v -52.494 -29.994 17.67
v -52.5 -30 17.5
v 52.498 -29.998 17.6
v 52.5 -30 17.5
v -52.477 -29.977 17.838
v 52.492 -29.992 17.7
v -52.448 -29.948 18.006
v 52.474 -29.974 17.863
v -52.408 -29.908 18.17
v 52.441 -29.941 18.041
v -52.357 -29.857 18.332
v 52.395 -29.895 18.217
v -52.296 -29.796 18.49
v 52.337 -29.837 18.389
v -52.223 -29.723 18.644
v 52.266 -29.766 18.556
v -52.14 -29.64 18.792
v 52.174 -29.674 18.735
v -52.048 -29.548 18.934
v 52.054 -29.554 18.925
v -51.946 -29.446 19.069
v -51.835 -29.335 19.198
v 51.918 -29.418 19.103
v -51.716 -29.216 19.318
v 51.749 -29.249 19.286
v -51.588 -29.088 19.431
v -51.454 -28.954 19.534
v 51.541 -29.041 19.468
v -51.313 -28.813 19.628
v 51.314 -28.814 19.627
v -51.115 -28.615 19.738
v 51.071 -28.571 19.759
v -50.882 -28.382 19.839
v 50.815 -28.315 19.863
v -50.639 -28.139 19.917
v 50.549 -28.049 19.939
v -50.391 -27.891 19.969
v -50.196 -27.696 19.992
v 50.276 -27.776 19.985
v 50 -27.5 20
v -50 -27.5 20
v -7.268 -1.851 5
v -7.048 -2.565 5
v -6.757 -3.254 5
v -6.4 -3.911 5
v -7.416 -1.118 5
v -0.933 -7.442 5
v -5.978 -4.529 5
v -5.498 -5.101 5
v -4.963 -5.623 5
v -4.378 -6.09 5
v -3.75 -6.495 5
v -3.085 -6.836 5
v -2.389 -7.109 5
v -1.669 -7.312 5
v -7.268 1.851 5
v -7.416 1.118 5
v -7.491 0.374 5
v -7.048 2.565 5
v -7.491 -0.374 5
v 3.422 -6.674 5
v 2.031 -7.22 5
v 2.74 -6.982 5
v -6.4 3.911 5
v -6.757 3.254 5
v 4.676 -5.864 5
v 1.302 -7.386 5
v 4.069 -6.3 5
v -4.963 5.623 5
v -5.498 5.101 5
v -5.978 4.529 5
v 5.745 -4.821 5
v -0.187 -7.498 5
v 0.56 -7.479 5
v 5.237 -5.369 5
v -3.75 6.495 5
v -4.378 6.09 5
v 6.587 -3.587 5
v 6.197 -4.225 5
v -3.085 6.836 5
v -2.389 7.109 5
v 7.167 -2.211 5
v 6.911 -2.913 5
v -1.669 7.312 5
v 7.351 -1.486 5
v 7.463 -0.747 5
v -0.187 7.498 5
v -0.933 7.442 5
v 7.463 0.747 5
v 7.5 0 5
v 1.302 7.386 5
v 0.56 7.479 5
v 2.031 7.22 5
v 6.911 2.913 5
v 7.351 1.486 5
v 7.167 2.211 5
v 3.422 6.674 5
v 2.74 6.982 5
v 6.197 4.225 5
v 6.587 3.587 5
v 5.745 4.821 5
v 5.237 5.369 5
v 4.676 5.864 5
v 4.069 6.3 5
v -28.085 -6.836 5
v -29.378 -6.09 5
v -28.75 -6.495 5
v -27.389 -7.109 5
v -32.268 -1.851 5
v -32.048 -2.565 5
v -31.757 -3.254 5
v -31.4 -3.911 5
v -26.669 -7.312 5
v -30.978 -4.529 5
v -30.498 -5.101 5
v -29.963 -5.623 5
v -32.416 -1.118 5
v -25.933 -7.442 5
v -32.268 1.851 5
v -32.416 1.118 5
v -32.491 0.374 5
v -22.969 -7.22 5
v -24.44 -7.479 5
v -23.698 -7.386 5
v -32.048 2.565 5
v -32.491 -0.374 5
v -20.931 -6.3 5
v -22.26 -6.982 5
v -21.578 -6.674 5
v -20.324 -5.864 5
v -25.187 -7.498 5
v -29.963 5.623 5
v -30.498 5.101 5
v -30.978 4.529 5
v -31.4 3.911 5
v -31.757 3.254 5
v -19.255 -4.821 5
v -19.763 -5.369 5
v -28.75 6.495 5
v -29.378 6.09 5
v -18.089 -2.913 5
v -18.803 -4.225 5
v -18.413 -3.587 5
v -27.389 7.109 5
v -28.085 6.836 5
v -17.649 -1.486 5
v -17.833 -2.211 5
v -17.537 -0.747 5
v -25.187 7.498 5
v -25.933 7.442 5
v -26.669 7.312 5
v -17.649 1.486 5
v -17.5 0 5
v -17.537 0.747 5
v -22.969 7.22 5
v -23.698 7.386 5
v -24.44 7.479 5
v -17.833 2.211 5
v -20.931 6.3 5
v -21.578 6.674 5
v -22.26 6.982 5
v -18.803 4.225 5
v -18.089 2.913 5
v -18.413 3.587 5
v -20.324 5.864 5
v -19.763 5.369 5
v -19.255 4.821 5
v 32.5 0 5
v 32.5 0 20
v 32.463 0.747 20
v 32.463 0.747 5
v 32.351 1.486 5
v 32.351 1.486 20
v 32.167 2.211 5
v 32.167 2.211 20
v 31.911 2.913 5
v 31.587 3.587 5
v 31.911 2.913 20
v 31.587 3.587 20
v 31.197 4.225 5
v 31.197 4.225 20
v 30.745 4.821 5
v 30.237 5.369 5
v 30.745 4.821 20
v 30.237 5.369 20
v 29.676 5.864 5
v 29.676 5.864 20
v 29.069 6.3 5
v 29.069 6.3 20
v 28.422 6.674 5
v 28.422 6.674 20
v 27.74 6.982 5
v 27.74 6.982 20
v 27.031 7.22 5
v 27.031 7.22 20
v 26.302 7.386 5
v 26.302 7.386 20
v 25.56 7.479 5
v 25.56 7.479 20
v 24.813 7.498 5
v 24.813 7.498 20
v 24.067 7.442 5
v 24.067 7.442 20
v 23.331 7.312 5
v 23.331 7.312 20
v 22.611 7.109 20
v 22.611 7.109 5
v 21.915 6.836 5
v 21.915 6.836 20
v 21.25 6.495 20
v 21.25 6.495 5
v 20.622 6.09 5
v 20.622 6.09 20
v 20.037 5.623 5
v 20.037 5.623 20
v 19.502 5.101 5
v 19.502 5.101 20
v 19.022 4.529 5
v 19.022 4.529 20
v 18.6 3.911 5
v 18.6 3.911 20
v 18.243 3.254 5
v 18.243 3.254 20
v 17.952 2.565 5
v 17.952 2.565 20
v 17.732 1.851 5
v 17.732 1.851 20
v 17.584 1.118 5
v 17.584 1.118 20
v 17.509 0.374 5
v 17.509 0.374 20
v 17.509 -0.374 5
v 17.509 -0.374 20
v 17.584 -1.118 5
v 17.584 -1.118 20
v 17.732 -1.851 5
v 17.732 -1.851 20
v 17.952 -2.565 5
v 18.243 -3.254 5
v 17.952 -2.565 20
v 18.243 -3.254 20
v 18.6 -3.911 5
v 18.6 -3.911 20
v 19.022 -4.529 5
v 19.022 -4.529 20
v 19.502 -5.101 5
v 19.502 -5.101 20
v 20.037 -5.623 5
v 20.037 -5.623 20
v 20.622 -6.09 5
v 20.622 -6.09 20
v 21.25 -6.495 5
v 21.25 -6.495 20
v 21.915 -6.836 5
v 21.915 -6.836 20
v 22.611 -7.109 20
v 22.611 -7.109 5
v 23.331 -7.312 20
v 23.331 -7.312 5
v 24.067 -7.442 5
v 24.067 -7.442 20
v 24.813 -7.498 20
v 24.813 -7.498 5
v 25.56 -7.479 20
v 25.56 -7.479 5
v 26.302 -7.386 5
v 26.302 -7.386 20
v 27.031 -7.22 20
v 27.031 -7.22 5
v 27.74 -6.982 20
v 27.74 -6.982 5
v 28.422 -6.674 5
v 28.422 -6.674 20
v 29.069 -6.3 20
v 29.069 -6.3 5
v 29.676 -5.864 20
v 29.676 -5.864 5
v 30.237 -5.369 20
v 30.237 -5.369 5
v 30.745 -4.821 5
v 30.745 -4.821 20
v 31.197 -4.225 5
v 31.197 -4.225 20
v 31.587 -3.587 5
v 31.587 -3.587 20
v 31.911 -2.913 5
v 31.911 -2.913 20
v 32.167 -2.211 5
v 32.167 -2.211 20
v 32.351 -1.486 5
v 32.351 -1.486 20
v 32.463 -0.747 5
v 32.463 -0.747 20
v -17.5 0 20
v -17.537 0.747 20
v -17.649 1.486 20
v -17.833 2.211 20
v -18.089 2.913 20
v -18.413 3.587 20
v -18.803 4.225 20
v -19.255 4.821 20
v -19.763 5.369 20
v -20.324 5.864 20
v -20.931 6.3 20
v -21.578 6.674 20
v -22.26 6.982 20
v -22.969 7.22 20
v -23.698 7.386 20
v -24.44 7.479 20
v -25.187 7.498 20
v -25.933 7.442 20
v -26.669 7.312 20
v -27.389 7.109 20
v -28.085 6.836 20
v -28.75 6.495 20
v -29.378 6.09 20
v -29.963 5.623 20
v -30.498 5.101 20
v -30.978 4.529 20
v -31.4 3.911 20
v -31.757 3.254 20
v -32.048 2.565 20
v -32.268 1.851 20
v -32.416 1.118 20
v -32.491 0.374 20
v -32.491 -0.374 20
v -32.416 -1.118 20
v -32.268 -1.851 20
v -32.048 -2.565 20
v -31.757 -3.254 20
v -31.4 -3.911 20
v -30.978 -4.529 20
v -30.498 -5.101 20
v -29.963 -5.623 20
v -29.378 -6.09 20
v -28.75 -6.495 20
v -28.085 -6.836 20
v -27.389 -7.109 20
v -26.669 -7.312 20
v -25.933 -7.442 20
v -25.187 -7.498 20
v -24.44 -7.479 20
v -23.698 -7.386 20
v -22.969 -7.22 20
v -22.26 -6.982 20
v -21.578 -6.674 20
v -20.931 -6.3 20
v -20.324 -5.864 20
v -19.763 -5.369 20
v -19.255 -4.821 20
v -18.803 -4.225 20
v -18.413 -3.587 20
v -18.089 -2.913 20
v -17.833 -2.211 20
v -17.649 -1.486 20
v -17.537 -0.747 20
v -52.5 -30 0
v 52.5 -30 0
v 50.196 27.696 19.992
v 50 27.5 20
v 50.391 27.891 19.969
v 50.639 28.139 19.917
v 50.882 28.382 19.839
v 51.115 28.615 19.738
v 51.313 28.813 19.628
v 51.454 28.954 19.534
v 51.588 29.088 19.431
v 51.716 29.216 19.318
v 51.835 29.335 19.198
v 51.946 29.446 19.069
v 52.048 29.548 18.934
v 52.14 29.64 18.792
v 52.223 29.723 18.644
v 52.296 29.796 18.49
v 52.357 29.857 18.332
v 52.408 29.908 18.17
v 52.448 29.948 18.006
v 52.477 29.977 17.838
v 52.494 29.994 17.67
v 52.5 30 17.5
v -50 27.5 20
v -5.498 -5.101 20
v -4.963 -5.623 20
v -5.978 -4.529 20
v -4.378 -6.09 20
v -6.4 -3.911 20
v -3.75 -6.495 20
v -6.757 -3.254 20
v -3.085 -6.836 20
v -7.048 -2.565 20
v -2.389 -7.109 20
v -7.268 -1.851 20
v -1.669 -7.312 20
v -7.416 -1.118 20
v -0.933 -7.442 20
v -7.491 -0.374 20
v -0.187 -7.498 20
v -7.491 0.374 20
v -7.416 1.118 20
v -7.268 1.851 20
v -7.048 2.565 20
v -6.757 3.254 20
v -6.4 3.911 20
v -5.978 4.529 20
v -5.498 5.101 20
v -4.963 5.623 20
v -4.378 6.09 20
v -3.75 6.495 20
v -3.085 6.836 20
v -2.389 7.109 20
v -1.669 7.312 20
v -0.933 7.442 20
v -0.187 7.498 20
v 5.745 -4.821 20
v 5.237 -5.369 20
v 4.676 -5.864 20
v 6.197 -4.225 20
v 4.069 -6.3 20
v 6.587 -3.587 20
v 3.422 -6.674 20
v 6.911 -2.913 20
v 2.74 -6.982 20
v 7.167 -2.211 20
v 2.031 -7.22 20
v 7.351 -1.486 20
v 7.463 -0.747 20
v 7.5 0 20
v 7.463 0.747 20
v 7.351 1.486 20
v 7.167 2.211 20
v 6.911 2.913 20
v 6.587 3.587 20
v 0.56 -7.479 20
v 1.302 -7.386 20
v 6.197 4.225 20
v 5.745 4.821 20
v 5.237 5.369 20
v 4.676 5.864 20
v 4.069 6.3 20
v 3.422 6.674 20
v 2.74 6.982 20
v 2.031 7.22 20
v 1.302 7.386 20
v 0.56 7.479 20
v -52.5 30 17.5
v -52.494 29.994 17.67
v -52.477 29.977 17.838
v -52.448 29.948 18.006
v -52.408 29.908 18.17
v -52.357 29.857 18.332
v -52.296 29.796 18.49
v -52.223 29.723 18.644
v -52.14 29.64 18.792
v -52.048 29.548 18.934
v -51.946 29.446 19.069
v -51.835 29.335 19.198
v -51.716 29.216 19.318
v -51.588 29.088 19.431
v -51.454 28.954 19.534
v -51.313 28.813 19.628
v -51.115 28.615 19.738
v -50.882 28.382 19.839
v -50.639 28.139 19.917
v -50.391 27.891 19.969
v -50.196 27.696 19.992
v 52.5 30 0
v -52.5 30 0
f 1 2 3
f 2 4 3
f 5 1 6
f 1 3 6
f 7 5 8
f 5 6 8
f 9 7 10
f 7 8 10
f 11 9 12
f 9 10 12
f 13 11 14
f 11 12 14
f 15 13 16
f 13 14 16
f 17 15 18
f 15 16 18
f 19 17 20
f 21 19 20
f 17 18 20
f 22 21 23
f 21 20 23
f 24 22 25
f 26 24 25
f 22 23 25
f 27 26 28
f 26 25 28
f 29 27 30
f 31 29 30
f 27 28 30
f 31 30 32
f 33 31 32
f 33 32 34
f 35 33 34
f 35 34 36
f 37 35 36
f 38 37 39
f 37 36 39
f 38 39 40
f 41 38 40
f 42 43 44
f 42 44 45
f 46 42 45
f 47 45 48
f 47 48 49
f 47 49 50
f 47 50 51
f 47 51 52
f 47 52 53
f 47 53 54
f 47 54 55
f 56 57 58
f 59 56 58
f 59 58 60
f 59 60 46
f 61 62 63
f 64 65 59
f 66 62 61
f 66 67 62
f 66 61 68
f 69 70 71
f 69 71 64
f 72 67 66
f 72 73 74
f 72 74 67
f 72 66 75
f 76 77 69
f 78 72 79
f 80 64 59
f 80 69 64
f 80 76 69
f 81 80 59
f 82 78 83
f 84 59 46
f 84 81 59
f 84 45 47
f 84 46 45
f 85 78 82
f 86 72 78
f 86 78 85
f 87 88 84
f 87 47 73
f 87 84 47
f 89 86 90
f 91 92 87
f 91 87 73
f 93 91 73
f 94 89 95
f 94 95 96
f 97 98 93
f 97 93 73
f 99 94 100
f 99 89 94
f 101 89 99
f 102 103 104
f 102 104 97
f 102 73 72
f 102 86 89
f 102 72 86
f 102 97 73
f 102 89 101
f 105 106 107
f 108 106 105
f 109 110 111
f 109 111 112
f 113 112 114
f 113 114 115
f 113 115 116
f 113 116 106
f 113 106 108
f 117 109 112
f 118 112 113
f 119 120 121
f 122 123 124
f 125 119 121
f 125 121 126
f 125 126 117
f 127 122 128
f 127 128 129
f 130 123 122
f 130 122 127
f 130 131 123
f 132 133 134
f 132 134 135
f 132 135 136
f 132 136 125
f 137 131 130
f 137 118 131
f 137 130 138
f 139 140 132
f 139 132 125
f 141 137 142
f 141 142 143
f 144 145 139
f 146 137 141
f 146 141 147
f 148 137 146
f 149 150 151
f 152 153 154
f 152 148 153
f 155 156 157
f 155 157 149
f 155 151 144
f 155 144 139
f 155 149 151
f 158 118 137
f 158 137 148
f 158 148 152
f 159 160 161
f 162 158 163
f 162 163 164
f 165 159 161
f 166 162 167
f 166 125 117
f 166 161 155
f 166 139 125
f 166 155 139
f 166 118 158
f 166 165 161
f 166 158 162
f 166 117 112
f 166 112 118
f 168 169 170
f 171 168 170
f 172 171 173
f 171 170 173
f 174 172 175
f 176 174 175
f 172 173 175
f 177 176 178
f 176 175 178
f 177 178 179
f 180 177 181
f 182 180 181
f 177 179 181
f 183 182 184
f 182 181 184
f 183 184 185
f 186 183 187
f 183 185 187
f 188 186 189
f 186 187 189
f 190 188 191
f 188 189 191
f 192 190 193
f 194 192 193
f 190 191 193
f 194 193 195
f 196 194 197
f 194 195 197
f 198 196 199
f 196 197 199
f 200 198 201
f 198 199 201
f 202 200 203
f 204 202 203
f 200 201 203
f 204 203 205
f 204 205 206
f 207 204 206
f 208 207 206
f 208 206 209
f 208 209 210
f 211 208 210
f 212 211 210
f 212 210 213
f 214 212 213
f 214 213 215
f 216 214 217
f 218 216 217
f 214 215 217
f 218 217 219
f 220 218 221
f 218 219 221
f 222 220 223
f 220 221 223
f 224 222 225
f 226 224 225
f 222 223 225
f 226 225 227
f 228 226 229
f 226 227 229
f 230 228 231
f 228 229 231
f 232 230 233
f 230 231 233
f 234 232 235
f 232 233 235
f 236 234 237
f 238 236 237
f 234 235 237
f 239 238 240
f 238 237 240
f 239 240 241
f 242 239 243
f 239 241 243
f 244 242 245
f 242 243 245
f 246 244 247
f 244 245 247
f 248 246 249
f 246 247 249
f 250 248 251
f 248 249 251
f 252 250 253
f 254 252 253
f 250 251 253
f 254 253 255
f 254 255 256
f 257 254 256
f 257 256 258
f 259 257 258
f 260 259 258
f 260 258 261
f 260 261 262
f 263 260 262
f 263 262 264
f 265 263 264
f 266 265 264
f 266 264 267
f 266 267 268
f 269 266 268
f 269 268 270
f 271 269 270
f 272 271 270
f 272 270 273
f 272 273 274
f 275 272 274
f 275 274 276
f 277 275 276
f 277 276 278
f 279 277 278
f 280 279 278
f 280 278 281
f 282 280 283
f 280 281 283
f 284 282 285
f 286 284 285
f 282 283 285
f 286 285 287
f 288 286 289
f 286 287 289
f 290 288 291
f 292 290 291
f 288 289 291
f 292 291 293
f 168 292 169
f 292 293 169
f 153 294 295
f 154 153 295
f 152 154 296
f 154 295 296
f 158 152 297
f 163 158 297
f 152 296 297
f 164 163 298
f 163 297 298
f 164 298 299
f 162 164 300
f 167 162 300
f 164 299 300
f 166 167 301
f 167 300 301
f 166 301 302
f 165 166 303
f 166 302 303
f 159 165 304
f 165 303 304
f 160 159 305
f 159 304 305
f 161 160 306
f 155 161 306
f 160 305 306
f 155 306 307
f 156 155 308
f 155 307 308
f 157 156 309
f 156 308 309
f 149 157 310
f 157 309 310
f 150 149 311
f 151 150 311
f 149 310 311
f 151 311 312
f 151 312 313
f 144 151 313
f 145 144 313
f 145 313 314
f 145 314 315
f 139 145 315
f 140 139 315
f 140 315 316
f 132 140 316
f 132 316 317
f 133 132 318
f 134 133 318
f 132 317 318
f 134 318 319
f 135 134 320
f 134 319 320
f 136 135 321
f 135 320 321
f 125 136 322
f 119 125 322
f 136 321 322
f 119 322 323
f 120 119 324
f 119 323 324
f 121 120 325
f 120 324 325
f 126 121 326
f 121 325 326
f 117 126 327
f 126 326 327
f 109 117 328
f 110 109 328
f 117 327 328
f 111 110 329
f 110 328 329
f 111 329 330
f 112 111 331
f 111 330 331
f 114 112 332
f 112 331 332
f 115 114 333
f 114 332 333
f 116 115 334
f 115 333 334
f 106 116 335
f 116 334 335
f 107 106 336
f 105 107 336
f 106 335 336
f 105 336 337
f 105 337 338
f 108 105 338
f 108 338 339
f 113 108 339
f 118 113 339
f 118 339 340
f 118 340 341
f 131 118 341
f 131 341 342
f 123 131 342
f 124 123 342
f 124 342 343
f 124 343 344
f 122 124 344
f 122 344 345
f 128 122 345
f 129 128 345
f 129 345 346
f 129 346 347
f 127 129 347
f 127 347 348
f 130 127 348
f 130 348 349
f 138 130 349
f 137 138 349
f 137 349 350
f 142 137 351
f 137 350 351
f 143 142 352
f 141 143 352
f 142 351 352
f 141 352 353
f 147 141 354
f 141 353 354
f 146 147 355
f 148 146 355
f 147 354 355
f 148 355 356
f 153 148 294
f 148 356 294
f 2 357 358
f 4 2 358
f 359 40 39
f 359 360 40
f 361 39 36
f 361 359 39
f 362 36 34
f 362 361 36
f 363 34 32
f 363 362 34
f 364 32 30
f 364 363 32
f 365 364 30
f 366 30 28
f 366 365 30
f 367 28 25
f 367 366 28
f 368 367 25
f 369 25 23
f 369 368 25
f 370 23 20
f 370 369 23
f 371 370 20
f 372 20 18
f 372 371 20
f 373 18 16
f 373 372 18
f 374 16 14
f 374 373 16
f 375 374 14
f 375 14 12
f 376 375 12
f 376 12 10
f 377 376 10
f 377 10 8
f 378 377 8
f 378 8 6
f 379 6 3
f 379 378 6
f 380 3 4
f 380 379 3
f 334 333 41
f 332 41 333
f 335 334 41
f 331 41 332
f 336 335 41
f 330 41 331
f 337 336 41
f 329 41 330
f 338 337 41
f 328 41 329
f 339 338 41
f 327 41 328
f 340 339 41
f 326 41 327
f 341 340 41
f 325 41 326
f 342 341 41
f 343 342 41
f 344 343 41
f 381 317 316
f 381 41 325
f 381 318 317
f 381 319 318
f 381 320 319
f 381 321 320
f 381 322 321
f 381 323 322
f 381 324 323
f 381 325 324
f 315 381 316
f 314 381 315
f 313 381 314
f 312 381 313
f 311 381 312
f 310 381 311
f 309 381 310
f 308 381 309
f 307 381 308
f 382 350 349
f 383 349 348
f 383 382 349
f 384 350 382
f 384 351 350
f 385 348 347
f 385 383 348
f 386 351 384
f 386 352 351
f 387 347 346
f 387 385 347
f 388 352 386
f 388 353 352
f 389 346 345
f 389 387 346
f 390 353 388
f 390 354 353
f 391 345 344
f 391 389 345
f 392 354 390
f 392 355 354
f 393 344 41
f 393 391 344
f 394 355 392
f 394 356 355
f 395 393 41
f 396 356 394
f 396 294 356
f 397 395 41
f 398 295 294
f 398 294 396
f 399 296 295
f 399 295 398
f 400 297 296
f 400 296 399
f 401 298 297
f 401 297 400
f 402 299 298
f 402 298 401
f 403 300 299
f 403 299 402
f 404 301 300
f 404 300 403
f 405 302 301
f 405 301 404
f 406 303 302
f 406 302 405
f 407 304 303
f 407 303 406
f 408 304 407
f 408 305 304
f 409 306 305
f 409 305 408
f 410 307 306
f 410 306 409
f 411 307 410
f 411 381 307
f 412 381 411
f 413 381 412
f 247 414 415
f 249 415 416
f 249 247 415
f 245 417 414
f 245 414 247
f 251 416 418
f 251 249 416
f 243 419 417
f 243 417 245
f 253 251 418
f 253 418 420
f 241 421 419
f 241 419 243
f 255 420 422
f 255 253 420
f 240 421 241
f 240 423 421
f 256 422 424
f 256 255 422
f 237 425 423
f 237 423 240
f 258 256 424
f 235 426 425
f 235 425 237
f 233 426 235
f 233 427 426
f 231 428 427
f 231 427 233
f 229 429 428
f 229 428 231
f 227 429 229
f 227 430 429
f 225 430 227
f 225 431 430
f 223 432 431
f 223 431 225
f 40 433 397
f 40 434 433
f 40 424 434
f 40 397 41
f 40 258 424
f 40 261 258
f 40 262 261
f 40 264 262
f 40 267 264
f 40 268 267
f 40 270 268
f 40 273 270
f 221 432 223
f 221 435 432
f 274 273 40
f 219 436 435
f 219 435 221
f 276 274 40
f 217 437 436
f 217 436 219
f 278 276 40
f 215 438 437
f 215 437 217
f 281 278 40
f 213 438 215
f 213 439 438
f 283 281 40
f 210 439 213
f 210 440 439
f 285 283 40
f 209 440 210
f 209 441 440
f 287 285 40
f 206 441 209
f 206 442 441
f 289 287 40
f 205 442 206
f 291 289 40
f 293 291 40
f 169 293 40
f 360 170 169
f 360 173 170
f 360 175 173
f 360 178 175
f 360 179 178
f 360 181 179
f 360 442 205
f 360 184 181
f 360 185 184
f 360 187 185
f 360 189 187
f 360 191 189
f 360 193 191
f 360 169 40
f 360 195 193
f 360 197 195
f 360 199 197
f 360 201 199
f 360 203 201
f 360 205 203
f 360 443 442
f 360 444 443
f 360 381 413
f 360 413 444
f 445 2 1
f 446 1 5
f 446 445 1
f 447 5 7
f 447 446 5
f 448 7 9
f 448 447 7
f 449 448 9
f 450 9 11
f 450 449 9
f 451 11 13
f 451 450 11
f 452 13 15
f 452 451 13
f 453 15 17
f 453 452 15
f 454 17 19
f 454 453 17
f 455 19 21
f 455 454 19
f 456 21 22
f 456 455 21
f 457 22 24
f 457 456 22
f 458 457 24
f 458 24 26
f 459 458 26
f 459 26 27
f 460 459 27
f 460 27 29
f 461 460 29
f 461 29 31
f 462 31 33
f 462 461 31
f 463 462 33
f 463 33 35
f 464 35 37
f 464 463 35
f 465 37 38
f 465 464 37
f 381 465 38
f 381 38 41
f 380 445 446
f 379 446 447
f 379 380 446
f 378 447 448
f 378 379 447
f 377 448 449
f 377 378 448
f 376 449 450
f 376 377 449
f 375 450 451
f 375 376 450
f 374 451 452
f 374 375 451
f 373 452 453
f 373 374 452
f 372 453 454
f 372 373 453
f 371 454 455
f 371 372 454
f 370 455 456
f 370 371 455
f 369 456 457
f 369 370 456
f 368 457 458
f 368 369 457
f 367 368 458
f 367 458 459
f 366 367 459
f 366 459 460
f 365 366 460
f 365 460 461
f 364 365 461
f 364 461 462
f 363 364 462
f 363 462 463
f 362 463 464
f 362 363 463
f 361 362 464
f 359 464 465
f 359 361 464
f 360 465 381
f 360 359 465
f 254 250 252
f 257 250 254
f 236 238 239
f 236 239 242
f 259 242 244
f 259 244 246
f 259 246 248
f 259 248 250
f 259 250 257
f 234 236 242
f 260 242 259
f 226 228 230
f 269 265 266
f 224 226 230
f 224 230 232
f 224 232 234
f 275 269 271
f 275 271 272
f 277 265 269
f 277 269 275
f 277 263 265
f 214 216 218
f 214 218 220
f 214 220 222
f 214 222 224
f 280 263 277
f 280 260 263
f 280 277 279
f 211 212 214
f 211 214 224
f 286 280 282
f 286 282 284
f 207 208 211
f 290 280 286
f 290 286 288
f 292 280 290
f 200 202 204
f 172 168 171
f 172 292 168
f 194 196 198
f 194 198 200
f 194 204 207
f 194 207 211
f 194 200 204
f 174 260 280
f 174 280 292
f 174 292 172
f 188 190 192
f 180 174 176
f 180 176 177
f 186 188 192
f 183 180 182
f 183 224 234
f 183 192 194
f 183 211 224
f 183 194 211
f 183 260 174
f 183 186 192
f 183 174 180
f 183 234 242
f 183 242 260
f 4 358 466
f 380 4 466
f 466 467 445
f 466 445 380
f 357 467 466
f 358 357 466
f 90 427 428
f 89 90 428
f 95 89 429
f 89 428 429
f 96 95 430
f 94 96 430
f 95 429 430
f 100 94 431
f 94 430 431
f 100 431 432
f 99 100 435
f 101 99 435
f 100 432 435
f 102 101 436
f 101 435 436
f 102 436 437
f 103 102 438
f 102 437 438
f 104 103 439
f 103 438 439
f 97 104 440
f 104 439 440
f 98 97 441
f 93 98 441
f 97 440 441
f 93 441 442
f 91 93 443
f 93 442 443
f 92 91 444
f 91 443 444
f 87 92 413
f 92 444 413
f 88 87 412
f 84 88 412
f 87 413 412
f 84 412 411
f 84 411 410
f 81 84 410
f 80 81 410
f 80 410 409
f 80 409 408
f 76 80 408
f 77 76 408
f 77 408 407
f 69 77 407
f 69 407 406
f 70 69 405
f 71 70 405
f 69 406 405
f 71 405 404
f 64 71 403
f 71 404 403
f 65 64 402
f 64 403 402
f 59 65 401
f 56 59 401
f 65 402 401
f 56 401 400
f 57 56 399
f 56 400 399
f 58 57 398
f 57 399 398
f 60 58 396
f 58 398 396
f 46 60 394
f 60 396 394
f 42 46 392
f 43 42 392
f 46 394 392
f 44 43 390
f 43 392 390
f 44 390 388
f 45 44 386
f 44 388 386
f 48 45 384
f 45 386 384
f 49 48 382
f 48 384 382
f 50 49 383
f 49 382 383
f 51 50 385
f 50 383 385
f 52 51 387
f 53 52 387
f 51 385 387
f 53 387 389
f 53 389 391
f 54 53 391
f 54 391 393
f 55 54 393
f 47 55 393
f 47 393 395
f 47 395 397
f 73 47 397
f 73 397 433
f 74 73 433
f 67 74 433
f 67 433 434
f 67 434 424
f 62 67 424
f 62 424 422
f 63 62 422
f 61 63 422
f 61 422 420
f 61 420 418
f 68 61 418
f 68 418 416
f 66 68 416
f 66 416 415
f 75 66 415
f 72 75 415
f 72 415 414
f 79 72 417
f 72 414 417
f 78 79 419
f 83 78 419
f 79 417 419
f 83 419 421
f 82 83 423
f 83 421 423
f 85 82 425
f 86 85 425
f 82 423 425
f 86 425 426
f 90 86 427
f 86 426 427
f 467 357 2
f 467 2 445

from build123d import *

# Parameters (mm, degrees)
F0_W     = 105
F0_H     = 60
F1_DEPTH = 20
F2_R     = 7.5
F3_DEPTH = 15
F4_R     = 2.5


with BuildPart() as f1:
    # F0 (on Top) → F1 (new body)
    with BuildSketch(Plane.XY):
        Rectangle(F0_W, F0_H)
    extrude(amount=F1_DEPTH)

    # F2 (on face) → F3 (cut)
    with BuildSketch(Plane.XY.offset(20)):
        with Locations((-25, 0)):
            Circle(F2_R)
        with Locations((25, 0)):
            Circle(F2_R)
        Circle(F2_R)
    extrude(amount=-F3_DEPTH, mode=Mode.SUBTRACT)

    # F4
    f4_edges = [f1.edges().sort_by_distance(p)[0] for p in [
        (-52.5, 0, 20),
        (0, 30, 20),
        (52.5, 0, 20),
        (0, -30, 20),
    ]]
    fillet(f4_edges, radius=F4_R)


solid = f1.part
